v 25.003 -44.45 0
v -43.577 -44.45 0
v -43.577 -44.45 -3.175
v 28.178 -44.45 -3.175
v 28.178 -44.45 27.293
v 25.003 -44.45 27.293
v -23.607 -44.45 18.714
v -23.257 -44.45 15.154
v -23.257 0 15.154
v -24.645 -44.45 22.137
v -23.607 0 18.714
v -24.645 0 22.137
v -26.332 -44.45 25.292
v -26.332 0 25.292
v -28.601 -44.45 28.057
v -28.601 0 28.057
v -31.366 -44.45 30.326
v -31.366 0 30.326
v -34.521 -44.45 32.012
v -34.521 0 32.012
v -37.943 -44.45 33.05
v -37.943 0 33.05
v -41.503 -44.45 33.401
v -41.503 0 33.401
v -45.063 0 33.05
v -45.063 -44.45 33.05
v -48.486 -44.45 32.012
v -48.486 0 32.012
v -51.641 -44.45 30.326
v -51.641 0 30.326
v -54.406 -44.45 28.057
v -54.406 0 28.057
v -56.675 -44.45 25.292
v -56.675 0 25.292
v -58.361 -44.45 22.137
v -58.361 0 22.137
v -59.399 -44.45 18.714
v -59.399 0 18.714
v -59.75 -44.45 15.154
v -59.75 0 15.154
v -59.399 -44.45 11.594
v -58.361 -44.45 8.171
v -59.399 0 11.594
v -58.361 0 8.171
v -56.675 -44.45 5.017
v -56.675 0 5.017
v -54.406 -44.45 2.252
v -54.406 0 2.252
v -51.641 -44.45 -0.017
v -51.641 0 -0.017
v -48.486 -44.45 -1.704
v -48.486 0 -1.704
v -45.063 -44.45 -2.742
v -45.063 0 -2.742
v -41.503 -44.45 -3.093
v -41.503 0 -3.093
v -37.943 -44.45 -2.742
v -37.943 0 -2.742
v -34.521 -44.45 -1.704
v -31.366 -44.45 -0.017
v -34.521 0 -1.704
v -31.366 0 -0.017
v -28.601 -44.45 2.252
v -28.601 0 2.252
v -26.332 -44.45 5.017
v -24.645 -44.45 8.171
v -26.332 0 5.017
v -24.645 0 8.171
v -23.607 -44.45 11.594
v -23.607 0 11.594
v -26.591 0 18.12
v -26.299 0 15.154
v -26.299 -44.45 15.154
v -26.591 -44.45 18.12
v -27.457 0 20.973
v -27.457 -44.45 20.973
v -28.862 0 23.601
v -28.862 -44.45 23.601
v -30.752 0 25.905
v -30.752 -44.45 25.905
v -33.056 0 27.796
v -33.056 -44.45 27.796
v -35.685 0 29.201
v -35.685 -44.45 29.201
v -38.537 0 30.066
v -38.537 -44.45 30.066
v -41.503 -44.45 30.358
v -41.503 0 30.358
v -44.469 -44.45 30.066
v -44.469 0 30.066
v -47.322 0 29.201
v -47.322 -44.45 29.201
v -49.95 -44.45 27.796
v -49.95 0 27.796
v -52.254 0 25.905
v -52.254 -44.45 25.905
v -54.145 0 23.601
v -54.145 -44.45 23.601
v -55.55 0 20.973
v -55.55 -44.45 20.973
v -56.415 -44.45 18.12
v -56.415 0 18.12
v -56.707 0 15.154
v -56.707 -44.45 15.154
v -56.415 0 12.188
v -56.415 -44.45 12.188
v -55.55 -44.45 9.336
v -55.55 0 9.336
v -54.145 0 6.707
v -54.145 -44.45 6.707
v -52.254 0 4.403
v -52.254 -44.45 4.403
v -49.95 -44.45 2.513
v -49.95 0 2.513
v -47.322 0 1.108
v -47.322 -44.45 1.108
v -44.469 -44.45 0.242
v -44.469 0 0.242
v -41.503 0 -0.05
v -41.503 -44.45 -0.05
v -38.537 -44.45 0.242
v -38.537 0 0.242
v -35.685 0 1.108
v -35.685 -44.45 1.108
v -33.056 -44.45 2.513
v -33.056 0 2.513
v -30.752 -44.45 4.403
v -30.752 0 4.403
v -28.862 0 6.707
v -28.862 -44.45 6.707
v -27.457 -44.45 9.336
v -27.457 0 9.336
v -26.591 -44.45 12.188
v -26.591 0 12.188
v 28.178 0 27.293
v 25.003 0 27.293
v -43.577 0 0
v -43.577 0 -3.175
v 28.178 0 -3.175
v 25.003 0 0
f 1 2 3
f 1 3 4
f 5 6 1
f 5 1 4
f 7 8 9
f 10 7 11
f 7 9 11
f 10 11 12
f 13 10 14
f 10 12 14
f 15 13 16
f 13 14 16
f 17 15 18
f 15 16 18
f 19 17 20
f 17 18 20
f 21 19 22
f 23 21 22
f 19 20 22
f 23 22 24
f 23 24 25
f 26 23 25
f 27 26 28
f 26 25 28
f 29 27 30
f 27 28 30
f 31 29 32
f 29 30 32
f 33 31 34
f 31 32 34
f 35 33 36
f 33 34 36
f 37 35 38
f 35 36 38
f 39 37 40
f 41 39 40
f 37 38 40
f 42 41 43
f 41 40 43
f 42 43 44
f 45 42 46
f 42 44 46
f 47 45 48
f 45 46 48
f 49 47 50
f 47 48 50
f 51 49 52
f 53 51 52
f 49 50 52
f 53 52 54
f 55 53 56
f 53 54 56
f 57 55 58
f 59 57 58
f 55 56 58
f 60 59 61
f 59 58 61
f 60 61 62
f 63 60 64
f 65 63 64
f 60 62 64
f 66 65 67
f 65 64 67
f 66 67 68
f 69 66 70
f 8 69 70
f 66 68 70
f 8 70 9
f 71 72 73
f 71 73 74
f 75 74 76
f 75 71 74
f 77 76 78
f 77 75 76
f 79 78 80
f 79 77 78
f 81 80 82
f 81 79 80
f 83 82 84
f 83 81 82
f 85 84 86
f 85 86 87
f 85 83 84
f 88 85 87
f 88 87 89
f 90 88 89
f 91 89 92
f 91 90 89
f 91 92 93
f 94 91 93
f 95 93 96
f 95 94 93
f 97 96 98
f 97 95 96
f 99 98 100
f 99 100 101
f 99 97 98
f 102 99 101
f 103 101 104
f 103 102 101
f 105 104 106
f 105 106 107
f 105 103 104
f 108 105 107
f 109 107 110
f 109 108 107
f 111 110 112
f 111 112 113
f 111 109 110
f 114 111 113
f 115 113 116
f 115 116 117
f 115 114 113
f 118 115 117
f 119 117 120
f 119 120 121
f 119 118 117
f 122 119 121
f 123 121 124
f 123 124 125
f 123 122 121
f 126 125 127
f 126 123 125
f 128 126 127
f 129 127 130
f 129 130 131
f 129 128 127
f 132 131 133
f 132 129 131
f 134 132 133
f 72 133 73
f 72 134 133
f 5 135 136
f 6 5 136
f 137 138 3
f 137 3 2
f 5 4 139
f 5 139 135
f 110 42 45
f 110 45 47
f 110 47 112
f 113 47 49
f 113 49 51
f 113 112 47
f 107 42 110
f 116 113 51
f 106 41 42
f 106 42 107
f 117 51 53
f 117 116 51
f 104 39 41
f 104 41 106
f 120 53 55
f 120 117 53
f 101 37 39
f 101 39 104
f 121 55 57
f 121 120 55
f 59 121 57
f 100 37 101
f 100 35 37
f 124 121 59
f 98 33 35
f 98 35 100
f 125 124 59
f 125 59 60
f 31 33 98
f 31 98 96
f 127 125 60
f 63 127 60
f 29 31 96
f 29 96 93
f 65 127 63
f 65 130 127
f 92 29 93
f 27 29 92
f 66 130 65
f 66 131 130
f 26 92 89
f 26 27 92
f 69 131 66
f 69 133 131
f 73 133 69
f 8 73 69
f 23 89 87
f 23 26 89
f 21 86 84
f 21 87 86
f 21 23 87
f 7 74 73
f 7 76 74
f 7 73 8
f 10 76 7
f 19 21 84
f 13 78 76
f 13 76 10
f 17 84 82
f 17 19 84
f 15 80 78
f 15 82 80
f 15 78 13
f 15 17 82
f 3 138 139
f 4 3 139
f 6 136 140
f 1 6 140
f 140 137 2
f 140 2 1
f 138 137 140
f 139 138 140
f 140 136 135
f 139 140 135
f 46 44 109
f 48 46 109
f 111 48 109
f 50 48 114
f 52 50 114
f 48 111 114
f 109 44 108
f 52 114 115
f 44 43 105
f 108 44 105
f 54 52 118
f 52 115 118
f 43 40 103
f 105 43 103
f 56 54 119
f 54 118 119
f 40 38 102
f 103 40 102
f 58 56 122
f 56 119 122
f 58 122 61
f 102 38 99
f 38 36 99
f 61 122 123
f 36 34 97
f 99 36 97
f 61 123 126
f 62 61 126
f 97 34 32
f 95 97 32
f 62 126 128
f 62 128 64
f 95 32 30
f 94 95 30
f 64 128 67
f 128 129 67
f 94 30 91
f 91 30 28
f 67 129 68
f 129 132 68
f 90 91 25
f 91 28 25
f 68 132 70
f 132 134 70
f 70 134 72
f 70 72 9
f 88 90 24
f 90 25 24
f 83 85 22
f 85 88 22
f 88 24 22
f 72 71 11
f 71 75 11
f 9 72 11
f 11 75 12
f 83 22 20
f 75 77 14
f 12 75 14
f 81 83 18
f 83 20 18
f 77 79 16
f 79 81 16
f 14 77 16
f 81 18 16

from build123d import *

# Parameters (mm, degrees)
F1_R     = 18.2467251248
F1_R_2   = 15.2039742304
F2_DEPTH = 44.45
F0_W     = 68.58
F0_H     = 3.175


with BuildPart() as f2:
    # F1 (on Front) → F2 (new body)
    with BuildSketch(Plane.XZ):
        with Locations((-41.5032282472, 15.1541987434)):
            Circle(F1_R)
        with Locations((-41.5032282472, 15.1541987434)):
            Circle(F1_R_2, mode=Mode.SUBTRACT)
    extrude(amount=F2_DEPTH)


with BuildPart() as f2b:
    # F0 (on Front) → F2, piece 2 (new body)
    with BuildSketch(Plane.XZ):
        with Locations((-9.2873283243, -1.5875)):
            Rectangle(F0_W, F0_H)
        Polygon((25.0026716757, 27.2931344807), (25.0026716757, 0), (25.0026716757, -3.175), (28.1776716757, -3.175), (28.1776716757, 27.2931344807), align=None)
    extrude(amount=F2_DEPTH)


solid = Compound([f2.part, f2b.part])
